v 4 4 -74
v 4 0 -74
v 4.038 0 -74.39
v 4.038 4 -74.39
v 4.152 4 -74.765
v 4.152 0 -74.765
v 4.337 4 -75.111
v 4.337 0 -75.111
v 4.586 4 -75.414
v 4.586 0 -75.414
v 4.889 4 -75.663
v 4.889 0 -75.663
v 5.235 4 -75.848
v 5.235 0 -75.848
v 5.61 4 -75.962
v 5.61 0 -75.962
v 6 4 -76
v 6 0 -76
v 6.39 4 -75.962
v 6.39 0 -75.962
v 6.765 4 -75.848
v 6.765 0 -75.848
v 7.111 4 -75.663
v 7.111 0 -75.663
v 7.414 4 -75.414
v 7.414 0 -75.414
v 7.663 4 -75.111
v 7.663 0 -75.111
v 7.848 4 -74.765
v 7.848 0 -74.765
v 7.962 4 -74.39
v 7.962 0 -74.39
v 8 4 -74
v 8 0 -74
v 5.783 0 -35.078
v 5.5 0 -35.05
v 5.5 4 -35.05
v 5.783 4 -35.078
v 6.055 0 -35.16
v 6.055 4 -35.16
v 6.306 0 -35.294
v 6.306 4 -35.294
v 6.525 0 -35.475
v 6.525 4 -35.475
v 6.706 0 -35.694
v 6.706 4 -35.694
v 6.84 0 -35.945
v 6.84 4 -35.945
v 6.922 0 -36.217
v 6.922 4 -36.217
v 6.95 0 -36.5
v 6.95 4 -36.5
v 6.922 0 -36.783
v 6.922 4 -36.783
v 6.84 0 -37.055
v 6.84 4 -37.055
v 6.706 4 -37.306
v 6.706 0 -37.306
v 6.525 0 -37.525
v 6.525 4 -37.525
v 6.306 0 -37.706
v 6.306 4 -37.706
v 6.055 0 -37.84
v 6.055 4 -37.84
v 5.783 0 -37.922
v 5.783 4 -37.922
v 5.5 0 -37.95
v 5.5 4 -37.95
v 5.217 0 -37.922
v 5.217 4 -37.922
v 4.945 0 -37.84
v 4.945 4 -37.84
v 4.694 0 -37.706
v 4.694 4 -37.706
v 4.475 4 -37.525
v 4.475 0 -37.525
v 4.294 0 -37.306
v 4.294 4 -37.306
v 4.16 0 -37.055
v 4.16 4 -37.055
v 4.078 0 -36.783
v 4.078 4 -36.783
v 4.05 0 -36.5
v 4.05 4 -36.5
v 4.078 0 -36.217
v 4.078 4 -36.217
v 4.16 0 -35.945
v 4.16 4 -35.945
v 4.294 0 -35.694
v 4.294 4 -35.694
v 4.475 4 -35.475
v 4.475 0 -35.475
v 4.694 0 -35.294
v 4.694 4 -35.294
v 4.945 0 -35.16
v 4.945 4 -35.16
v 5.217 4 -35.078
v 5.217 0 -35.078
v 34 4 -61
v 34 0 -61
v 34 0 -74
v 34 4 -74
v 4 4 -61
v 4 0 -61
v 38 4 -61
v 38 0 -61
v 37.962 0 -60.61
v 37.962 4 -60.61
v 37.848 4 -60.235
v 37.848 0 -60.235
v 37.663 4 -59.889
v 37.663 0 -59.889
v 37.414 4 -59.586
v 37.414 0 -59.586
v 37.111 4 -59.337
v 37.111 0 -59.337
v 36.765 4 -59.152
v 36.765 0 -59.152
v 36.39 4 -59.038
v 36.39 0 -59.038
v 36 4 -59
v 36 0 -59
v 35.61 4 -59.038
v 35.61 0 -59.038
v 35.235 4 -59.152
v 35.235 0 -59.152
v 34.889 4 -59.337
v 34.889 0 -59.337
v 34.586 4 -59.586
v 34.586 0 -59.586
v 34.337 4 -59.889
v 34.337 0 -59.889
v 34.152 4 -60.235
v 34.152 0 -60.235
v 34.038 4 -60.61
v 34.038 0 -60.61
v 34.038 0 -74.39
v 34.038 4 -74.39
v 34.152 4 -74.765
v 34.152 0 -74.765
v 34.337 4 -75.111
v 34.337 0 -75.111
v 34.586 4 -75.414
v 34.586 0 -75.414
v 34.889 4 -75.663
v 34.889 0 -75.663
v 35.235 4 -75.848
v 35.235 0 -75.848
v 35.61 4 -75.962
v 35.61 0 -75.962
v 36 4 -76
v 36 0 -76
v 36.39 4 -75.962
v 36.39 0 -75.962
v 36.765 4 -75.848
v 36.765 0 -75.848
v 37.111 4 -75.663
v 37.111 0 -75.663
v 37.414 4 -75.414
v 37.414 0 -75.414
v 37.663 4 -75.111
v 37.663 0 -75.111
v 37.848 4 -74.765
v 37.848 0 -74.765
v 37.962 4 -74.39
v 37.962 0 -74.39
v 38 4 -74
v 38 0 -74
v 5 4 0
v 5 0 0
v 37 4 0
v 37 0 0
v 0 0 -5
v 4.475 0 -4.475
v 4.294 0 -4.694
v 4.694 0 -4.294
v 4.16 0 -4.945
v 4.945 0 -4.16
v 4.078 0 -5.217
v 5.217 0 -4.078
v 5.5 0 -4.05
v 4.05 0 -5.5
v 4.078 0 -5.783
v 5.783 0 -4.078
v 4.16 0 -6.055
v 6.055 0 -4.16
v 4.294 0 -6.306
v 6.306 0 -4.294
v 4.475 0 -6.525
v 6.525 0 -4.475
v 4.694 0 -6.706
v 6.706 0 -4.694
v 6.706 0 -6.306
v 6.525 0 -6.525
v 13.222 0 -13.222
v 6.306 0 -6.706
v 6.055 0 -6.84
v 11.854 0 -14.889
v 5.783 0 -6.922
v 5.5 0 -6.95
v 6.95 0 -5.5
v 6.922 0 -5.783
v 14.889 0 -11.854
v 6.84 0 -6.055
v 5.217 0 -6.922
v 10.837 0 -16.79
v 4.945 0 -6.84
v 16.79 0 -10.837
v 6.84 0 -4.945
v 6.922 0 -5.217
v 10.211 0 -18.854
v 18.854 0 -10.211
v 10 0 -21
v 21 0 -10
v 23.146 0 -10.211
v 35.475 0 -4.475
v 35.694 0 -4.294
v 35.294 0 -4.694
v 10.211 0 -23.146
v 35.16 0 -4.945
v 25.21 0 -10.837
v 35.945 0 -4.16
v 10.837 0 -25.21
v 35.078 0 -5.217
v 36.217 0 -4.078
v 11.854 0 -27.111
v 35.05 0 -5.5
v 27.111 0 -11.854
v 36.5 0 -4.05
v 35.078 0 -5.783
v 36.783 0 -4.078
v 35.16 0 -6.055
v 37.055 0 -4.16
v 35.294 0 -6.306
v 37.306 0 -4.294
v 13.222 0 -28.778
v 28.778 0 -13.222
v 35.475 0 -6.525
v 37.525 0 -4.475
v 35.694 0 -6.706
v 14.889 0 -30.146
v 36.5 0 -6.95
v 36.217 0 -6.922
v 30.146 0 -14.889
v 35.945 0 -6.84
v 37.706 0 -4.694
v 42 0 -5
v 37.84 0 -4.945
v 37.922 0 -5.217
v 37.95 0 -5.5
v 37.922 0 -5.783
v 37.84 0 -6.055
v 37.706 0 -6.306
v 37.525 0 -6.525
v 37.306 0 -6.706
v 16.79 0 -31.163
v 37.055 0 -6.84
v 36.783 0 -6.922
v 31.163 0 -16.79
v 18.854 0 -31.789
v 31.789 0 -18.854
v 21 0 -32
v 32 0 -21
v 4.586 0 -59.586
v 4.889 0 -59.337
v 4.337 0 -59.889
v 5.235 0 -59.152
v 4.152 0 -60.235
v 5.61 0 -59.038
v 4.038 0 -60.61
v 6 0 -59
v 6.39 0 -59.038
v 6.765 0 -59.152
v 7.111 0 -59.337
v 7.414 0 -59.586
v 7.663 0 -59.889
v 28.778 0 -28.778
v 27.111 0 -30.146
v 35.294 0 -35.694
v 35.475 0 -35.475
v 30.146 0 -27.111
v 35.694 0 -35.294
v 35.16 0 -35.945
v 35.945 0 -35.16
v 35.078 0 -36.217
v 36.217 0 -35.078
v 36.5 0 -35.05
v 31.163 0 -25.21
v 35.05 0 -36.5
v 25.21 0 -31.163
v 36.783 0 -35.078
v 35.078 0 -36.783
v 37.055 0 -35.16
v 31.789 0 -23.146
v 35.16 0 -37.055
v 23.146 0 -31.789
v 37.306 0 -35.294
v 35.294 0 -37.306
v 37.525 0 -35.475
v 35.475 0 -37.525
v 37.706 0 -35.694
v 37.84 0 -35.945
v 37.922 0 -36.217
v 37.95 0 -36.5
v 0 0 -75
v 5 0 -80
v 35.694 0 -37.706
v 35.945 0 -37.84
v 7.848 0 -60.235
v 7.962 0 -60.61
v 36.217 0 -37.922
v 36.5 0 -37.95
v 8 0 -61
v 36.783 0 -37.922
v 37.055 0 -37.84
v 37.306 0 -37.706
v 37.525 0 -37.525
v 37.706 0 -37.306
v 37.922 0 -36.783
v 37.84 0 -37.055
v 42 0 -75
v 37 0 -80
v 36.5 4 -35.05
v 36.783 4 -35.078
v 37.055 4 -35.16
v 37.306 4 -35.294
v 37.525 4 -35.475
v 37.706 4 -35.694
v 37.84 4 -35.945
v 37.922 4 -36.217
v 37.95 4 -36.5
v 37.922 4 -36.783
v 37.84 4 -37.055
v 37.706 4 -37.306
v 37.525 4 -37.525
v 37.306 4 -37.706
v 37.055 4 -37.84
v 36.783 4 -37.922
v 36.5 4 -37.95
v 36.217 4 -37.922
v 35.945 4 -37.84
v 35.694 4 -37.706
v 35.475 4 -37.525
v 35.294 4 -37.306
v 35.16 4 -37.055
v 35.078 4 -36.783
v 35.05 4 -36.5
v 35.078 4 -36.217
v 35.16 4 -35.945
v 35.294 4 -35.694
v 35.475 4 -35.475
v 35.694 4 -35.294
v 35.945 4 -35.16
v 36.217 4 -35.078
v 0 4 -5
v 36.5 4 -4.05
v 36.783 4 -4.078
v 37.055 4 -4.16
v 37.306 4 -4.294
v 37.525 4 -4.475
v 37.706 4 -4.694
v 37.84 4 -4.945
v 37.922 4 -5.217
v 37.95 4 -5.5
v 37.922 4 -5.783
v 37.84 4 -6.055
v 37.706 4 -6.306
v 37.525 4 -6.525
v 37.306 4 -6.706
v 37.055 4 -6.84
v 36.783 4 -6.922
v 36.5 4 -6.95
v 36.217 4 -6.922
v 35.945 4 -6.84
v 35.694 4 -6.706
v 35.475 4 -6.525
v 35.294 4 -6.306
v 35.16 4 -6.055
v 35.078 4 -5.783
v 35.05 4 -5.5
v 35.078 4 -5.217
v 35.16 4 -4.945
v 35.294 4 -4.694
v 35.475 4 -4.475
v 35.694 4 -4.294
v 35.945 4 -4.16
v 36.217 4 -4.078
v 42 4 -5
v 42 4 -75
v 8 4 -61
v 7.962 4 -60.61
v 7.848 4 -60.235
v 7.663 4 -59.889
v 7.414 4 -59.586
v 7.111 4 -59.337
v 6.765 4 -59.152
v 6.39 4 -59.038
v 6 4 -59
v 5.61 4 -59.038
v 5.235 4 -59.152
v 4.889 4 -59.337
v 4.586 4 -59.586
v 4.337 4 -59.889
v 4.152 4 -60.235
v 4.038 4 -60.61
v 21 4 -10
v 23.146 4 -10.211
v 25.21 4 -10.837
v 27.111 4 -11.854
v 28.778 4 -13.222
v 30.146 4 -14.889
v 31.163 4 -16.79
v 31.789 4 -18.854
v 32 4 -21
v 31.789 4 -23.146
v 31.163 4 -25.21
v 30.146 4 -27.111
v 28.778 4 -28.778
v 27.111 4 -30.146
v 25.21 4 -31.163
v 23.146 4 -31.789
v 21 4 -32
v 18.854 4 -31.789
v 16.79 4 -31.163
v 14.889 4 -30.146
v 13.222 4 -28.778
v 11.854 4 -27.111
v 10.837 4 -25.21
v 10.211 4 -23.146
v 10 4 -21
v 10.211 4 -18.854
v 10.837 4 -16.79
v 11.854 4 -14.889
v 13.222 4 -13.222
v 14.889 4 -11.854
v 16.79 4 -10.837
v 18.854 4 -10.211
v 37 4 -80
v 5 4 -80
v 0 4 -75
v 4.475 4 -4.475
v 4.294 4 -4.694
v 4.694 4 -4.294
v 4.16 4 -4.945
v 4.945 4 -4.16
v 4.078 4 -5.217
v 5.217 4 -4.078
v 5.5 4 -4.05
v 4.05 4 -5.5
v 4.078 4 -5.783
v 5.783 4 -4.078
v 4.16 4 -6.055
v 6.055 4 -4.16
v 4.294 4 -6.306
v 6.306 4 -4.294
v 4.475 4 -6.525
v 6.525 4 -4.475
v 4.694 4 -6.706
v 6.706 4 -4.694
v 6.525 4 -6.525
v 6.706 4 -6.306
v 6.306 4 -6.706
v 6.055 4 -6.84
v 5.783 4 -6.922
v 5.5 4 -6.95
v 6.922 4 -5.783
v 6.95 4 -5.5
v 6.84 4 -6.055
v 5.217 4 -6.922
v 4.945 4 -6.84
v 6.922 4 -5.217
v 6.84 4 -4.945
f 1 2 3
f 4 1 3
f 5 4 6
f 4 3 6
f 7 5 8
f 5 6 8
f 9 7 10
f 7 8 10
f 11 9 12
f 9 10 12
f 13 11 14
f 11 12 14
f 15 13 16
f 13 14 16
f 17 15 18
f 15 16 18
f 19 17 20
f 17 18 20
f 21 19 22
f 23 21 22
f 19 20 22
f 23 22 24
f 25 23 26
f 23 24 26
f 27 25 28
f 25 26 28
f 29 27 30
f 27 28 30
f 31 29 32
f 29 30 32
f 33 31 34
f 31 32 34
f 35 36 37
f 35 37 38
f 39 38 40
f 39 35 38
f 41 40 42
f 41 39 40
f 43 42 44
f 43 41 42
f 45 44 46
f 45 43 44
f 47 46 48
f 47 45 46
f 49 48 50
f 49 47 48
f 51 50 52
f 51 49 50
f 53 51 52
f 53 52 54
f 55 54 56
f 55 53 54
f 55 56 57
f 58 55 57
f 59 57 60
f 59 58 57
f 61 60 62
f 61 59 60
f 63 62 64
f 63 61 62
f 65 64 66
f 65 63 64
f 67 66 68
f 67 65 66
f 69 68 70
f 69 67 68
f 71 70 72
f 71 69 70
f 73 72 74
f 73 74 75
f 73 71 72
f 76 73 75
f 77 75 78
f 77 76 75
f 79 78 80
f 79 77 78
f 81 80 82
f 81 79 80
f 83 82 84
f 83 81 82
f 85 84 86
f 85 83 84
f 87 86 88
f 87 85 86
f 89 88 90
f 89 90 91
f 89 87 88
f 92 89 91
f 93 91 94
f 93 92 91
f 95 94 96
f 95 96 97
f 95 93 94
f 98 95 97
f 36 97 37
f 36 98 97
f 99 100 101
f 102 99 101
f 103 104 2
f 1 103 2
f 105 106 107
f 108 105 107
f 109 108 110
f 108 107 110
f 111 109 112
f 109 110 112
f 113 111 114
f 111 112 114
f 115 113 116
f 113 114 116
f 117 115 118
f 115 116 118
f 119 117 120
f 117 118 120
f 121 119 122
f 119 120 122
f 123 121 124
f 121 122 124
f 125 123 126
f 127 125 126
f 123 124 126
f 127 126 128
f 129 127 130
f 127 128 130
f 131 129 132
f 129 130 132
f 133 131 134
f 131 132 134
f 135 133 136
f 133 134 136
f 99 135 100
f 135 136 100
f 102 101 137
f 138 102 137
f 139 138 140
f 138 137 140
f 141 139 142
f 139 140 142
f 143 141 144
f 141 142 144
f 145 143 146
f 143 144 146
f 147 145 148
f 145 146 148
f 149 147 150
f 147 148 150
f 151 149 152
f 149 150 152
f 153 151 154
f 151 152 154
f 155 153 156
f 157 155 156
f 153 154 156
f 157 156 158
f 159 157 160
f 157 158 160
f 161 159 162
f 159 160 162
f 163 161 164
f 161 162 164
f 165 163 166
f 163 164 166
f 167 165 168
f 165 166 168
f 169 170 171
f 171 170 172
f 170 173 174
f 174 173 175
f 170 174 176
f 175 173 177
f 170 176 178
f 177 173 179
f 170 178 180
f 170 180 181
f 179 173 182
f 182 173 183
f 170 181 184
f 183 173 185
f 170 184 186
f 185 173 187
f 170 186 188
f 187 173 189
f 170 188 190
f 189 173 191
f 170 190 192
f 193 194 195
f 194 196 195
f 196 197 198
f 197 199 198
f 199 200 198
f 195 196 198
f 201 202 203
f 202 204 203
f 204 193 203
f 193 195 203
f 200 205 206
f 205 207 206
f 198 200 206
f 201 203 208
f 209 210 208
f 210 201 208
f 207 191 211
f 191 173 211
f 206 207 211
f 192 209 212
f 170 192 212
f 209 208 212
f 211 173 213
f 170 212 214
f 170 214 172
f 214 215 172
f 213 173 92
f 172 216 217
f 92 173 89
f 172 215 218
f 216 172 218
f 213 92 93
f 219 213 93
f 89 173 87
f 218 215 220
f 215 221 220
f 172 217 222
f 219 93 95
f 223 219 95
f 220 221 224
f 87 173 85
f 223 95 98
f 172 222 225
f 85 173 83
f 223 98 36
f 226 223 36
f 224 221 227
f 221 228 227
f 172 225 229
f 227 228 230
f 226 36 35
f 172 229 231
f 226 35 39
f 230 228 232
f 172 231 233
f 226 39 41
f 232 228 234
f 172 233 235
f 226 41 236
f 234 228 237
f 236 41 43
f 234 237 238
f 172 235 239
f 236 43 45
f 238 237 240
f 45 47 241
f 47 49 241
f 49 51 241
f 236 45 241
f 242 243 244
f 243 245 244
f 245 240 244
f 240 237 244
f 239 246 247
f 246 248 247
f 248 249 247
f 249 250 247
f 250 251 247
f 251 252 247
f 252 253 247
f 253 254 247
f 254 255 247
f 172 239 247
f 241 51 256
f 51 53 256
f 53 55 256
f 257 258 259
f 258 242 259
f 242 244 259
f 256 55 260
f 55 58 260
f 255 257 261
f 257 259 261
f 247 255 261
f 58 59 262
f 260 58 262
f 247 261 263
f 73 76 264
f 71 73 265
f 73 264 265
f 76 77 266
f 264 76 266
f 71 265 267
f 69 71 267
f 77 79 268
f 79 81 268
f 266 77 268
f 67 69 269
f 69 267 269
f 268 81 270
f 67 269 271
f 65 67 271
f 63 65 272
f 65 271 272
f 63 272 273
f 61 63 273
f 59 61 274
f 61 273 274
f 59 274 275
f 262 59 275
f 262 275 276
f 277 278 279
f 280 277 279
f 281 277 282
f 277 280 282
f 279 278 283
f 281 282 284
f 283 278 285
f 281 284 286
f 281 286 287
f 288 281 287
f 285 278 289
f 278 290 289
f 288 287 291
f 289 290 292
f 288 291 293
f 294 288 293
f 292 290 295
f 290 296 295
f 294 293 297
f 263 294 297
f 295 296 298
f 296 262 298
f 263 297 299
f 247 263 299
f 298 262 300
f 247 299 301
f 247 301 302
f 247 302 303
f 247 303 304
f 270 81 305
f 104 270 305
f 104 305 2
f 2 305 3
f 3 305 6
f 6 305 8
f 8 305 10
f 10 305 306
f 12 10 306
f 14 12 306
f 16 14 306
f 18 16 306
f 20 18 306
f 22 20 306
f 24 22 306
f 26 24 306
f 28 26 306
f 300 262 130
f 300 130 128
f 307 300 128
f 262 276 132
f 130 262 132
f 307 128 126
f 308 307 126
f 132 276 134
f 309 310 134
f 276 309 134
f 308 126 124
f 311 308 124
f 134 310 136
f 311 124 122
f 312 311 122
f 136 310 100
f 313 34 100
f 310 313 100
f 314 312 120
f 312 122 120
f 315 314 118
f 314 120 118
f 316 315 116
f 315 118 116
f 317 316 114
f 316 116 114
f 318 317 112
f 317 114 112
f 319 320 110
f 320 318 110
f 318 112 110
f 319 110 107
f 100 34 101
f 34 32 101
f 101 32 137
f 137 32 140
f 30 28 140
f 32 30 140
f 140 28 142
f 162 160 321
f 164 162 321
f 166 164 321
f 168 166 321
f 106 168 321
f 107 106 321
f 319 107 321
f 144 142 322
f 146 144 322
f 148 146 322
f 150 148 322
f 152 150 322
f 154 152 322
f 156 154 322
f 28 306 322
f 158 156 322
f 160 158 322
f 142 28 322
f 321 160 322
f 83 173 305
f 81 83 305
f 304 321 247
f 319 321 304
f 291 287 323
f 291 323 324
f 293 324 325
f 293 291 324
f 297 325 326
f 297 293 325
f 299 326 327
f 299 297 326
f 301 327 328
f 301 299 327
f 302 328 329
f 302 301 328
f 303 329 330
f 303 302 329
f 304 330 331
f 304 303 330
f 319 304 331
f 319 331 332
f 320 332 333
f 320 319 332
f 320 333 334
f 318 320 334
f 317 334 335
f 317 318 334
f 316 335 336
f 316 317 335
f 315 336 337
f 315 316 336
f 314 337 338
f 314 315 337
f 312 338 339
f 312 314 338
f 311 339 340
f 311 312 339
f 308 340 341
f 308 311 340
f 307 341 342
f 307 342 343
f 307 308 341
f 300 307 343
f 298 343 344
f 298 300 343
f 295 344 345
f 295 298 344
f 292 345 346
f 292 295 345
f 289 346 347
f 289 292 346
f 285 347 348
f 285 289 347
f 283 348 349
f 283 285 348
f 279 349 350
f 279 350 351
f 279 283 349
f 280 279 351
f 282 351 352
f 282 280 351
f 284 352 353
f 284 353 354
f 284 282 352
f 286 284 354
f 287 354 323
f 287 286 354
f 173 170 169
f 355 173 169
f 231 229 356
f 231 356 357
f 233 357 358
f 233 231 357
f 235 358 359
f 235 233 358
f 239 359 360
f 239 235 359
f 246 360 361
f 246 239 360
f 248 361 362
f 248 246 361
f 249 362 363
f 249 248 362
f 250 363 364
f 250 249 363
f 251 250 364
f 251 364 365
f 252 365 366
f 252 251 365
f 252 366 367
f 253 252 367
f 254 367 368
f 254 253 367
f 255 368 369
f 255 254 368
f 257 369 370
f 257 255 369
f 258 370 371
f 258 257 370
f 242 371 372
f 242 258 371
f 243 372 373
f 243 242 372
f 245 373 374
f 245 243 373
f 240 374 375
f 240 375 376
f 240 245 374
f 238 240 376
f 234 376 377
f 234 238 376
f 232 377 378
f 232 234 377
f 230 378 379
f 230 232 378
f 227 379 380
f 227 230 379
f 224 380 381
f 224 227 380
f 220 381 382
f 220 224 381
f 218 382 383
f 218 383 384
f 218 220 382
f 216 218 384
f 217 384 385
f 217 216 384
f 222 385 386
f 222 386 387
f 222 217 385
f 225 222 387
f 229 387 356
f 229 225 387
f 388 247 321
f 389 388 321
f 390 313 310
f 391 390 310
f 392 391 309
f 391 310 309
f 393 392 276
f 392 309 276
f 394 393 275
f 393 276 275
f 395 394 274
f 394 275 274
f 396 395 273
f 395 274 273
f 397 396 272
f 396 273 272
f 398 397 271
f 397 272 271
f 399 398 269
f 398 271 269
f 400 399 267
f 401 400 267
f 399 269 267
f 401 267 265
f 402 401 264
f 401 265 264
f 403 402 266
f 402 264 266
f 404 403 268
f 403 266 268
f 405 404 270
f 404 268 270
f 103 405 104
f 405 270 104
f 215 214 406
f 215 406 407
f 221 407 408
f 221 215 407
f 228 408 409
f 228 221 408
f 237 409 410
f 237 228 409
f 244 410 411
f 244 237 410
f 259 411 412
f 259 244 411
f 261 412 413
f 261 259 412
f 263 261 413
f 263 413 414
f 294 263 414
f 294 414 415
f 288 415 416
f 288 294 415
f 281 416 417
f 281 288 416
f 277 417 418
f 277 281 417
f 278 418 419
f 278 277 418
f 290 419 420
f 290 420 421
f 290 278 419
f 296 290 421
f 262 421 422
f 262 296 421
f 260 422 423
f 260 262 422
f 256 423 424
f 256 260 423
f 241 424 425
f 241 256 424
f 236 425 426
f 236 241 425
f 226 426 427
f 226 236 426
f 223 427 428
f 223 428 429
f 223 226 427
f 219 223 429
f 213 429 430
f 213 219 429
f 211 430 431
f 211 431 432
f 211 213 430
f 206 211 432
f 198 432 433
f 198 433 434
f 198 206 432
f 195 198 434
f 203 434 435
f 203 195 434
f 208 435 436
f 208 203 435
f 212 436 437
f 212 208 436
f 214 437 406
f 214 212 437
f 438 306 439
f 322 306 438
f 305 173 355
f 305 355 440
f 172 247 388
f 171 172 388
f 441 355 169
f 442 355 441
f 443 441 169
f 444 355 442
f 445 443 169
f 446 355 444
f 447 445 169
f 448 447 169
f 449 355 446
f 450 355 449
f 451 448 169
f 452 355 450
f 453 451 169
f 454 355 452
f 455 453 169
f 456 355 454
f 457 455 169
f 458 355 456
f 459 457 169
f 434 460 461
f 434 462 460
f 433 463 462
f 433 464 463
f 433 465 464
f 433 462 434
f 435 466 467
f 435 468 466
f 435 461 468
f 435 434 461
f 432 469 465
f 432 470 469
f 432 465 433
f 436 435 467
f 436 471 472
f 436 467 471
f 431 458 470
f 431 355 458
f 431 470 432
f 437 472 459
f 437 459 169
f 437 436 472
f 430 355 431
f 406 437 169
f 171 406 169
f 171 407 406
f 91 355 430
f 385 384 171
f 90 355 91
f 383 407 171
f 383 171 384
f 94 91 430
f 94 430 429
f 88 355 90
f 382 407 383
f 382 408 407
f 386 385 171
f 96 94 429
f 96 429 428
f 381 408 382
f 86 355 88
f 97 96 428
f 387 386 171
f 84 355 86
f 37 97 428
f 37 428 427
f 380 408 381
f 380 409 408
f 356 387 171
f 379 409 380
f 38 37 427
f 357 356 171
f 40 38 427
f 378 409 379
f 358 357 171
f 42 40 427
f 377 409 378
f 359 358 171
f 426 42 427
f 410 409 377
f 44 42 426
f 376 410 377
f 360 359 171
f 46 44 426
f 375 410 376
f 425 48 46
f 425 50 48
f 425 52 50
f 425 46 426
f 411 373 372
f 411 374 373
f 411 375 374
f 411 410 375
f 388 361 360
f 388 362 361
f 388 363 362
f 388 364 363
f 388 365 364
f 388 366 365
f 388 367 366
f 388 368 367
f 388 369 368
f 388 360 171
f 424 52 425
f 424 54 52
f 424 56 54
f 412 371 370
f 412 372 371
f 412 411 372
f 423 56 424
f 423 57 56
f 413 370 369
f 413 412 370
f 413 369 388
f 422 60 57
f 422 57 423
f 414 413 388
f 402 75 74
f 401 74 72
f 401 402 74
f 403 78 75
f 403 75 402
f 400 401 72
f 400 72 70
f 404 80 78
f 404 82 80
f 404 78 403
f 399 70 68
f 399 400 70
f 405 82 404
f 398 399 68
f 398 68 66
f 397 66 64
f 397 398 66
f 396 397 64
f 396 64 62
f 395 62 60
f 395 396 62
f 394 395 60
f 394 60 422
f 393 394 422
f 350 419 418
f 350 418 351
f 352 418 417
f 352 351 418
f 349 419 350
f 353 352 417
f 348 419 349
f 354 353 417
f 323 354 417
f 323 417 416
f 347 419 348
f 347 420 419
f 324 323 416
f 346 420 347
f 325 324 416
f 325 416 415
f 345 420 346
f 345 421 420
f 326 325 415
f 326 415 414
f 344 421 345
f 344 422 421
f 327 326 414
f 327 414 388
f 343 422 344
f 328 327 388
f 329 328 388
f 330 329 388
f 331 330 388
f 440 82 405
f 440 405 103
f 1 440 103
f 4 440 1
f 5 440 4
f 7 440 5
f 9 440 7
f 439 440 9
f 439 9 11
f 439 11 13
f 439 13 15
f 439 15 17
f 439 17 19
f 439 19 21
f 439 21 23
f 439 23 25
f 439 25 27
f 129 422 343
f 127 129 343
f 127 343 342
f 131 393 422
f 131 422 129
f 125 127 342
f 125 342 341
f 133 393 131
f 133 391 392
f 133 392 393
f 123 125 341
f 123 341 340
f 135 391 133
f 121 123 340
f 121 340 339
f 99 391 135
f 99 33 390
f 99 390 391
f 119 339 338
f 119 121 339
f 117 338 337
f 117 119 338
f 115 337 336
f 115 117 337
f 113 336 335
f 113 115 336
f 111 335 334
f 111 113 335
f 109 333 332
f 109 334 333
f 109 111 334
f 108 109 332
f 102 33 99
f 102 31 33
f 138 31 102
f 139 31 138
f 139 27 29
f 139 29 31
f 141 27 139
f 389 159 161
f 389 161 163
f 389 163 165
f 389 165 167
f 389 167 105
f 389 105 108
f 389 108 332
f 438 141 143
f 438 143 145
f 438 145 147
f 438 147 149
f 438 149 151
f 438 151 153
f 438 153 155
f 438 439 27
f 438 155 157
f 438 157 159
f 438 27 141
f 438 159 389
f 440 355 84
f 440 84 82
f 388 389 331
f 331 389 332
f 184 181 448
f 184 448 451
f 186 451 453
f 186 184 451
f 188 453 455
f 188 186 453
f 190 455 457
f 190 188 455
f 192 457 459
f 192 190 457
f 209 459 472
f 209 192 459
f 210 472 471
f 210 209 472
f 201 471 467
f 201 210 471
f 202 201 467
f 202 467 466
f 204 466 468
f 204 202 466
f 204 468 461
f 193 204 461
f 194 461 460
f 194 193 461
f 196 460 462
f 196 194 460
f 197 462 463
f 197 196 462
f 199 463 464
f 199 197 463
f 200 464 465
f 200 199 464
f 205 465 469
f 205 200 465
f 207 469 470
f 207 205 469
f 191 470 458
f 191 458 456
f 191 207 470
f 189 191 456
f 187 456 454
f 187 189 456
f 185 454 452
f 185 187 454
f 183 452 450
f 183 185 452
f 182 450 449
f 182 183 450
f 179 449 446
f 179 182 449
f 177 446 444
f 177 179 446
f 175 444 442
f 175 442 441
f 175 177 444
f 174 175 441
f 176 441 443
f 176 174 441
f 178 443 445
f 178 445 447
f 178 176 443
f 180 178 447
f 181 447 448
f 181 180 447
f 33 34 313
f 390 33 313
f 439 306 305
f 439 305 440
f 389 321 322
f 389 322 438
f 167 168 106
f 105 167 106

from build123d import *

# Parameters (mm, degrees)
SKETCH_1_W      = 42
SKETCH_1_H      = 80
SKETCH_1_R      = 11
SKETCH_1_R_2    = 1.45
EXTRUDE_1_DEPTH = 4
CHAMFER_1_SIZE  = 5


with BuildPart() as part:
    # 草图1 → 凸台-拉伸1 (new body)
    with BuildSketch(Plane(origin=(0, 0, 0), x_dir=(1, 0, 0), z_dir=(0, 1, 0))):
        with Locations((21, 40)):
            Rectangle(SKETCH_1_W, SKETCH_1_H)
        with Locations(Location((21, 21, 0), (0, 0, 270))):
            Circle(SKETCH_1_R, mode=Mode.SUBTRACT)
        with Locations(Location((5.5, 36.5, 0), (0, 0, 270))):
            Circle(SKETCH_1_R_2, mode=Mode.SUBTRACT)
        with Locations(Location((5.5, 5.5, 0), (0, 0, 270))):
            Circle(SKETCH_1_R_2, mode=Mode.SUBTRACT)
        with Locations(Location((36.5, 36.5, 0), (0, 0, 270))):
            Circle(SKETCH_1_R_2, mode=Mode.SUBTRACT)
        with Locations(Location((36.5, 5.5, 0), (0, 0, 270))):
            Circle(SKETCH_1_R_2, mode=Mode.SUBTRACT)
        with BuildLine():
            Line((8, 74), (8, 61))
            ThreePointArc((8, 61), (6, 59), (4, 61))
            Line((4, 61), (4, 74))
            ThreePointArc((4, 74), (6, 76), (8, 74))
        make_face(mode=Mode.SUBTRACT)
        with BuildLine():
            Line((38, 74), (38, 61))
            ThreePointArc((38, 61), (36, 59), (34, 61))
            Line((34, 61), (34, 74))
            ThreePointArc((34, 74), (36, 76), (38, 74))
        make_face(mode=Mode.SUBTRACT)
    extrude(amount=EXTRUDE_1_DEPTH)

    # 倒角1
    chamfer_1_edges = [part.edges().sort_by_distance(p)[0] for p in [
        (0, 2, -80),
        (42, 2, -80),
        (42, 2, 0),
        (0, 2, 0),
    ]]
    chamfer(chamfer_1_edges, length=CHAMFER_1_SIZE)


solid = part.part
